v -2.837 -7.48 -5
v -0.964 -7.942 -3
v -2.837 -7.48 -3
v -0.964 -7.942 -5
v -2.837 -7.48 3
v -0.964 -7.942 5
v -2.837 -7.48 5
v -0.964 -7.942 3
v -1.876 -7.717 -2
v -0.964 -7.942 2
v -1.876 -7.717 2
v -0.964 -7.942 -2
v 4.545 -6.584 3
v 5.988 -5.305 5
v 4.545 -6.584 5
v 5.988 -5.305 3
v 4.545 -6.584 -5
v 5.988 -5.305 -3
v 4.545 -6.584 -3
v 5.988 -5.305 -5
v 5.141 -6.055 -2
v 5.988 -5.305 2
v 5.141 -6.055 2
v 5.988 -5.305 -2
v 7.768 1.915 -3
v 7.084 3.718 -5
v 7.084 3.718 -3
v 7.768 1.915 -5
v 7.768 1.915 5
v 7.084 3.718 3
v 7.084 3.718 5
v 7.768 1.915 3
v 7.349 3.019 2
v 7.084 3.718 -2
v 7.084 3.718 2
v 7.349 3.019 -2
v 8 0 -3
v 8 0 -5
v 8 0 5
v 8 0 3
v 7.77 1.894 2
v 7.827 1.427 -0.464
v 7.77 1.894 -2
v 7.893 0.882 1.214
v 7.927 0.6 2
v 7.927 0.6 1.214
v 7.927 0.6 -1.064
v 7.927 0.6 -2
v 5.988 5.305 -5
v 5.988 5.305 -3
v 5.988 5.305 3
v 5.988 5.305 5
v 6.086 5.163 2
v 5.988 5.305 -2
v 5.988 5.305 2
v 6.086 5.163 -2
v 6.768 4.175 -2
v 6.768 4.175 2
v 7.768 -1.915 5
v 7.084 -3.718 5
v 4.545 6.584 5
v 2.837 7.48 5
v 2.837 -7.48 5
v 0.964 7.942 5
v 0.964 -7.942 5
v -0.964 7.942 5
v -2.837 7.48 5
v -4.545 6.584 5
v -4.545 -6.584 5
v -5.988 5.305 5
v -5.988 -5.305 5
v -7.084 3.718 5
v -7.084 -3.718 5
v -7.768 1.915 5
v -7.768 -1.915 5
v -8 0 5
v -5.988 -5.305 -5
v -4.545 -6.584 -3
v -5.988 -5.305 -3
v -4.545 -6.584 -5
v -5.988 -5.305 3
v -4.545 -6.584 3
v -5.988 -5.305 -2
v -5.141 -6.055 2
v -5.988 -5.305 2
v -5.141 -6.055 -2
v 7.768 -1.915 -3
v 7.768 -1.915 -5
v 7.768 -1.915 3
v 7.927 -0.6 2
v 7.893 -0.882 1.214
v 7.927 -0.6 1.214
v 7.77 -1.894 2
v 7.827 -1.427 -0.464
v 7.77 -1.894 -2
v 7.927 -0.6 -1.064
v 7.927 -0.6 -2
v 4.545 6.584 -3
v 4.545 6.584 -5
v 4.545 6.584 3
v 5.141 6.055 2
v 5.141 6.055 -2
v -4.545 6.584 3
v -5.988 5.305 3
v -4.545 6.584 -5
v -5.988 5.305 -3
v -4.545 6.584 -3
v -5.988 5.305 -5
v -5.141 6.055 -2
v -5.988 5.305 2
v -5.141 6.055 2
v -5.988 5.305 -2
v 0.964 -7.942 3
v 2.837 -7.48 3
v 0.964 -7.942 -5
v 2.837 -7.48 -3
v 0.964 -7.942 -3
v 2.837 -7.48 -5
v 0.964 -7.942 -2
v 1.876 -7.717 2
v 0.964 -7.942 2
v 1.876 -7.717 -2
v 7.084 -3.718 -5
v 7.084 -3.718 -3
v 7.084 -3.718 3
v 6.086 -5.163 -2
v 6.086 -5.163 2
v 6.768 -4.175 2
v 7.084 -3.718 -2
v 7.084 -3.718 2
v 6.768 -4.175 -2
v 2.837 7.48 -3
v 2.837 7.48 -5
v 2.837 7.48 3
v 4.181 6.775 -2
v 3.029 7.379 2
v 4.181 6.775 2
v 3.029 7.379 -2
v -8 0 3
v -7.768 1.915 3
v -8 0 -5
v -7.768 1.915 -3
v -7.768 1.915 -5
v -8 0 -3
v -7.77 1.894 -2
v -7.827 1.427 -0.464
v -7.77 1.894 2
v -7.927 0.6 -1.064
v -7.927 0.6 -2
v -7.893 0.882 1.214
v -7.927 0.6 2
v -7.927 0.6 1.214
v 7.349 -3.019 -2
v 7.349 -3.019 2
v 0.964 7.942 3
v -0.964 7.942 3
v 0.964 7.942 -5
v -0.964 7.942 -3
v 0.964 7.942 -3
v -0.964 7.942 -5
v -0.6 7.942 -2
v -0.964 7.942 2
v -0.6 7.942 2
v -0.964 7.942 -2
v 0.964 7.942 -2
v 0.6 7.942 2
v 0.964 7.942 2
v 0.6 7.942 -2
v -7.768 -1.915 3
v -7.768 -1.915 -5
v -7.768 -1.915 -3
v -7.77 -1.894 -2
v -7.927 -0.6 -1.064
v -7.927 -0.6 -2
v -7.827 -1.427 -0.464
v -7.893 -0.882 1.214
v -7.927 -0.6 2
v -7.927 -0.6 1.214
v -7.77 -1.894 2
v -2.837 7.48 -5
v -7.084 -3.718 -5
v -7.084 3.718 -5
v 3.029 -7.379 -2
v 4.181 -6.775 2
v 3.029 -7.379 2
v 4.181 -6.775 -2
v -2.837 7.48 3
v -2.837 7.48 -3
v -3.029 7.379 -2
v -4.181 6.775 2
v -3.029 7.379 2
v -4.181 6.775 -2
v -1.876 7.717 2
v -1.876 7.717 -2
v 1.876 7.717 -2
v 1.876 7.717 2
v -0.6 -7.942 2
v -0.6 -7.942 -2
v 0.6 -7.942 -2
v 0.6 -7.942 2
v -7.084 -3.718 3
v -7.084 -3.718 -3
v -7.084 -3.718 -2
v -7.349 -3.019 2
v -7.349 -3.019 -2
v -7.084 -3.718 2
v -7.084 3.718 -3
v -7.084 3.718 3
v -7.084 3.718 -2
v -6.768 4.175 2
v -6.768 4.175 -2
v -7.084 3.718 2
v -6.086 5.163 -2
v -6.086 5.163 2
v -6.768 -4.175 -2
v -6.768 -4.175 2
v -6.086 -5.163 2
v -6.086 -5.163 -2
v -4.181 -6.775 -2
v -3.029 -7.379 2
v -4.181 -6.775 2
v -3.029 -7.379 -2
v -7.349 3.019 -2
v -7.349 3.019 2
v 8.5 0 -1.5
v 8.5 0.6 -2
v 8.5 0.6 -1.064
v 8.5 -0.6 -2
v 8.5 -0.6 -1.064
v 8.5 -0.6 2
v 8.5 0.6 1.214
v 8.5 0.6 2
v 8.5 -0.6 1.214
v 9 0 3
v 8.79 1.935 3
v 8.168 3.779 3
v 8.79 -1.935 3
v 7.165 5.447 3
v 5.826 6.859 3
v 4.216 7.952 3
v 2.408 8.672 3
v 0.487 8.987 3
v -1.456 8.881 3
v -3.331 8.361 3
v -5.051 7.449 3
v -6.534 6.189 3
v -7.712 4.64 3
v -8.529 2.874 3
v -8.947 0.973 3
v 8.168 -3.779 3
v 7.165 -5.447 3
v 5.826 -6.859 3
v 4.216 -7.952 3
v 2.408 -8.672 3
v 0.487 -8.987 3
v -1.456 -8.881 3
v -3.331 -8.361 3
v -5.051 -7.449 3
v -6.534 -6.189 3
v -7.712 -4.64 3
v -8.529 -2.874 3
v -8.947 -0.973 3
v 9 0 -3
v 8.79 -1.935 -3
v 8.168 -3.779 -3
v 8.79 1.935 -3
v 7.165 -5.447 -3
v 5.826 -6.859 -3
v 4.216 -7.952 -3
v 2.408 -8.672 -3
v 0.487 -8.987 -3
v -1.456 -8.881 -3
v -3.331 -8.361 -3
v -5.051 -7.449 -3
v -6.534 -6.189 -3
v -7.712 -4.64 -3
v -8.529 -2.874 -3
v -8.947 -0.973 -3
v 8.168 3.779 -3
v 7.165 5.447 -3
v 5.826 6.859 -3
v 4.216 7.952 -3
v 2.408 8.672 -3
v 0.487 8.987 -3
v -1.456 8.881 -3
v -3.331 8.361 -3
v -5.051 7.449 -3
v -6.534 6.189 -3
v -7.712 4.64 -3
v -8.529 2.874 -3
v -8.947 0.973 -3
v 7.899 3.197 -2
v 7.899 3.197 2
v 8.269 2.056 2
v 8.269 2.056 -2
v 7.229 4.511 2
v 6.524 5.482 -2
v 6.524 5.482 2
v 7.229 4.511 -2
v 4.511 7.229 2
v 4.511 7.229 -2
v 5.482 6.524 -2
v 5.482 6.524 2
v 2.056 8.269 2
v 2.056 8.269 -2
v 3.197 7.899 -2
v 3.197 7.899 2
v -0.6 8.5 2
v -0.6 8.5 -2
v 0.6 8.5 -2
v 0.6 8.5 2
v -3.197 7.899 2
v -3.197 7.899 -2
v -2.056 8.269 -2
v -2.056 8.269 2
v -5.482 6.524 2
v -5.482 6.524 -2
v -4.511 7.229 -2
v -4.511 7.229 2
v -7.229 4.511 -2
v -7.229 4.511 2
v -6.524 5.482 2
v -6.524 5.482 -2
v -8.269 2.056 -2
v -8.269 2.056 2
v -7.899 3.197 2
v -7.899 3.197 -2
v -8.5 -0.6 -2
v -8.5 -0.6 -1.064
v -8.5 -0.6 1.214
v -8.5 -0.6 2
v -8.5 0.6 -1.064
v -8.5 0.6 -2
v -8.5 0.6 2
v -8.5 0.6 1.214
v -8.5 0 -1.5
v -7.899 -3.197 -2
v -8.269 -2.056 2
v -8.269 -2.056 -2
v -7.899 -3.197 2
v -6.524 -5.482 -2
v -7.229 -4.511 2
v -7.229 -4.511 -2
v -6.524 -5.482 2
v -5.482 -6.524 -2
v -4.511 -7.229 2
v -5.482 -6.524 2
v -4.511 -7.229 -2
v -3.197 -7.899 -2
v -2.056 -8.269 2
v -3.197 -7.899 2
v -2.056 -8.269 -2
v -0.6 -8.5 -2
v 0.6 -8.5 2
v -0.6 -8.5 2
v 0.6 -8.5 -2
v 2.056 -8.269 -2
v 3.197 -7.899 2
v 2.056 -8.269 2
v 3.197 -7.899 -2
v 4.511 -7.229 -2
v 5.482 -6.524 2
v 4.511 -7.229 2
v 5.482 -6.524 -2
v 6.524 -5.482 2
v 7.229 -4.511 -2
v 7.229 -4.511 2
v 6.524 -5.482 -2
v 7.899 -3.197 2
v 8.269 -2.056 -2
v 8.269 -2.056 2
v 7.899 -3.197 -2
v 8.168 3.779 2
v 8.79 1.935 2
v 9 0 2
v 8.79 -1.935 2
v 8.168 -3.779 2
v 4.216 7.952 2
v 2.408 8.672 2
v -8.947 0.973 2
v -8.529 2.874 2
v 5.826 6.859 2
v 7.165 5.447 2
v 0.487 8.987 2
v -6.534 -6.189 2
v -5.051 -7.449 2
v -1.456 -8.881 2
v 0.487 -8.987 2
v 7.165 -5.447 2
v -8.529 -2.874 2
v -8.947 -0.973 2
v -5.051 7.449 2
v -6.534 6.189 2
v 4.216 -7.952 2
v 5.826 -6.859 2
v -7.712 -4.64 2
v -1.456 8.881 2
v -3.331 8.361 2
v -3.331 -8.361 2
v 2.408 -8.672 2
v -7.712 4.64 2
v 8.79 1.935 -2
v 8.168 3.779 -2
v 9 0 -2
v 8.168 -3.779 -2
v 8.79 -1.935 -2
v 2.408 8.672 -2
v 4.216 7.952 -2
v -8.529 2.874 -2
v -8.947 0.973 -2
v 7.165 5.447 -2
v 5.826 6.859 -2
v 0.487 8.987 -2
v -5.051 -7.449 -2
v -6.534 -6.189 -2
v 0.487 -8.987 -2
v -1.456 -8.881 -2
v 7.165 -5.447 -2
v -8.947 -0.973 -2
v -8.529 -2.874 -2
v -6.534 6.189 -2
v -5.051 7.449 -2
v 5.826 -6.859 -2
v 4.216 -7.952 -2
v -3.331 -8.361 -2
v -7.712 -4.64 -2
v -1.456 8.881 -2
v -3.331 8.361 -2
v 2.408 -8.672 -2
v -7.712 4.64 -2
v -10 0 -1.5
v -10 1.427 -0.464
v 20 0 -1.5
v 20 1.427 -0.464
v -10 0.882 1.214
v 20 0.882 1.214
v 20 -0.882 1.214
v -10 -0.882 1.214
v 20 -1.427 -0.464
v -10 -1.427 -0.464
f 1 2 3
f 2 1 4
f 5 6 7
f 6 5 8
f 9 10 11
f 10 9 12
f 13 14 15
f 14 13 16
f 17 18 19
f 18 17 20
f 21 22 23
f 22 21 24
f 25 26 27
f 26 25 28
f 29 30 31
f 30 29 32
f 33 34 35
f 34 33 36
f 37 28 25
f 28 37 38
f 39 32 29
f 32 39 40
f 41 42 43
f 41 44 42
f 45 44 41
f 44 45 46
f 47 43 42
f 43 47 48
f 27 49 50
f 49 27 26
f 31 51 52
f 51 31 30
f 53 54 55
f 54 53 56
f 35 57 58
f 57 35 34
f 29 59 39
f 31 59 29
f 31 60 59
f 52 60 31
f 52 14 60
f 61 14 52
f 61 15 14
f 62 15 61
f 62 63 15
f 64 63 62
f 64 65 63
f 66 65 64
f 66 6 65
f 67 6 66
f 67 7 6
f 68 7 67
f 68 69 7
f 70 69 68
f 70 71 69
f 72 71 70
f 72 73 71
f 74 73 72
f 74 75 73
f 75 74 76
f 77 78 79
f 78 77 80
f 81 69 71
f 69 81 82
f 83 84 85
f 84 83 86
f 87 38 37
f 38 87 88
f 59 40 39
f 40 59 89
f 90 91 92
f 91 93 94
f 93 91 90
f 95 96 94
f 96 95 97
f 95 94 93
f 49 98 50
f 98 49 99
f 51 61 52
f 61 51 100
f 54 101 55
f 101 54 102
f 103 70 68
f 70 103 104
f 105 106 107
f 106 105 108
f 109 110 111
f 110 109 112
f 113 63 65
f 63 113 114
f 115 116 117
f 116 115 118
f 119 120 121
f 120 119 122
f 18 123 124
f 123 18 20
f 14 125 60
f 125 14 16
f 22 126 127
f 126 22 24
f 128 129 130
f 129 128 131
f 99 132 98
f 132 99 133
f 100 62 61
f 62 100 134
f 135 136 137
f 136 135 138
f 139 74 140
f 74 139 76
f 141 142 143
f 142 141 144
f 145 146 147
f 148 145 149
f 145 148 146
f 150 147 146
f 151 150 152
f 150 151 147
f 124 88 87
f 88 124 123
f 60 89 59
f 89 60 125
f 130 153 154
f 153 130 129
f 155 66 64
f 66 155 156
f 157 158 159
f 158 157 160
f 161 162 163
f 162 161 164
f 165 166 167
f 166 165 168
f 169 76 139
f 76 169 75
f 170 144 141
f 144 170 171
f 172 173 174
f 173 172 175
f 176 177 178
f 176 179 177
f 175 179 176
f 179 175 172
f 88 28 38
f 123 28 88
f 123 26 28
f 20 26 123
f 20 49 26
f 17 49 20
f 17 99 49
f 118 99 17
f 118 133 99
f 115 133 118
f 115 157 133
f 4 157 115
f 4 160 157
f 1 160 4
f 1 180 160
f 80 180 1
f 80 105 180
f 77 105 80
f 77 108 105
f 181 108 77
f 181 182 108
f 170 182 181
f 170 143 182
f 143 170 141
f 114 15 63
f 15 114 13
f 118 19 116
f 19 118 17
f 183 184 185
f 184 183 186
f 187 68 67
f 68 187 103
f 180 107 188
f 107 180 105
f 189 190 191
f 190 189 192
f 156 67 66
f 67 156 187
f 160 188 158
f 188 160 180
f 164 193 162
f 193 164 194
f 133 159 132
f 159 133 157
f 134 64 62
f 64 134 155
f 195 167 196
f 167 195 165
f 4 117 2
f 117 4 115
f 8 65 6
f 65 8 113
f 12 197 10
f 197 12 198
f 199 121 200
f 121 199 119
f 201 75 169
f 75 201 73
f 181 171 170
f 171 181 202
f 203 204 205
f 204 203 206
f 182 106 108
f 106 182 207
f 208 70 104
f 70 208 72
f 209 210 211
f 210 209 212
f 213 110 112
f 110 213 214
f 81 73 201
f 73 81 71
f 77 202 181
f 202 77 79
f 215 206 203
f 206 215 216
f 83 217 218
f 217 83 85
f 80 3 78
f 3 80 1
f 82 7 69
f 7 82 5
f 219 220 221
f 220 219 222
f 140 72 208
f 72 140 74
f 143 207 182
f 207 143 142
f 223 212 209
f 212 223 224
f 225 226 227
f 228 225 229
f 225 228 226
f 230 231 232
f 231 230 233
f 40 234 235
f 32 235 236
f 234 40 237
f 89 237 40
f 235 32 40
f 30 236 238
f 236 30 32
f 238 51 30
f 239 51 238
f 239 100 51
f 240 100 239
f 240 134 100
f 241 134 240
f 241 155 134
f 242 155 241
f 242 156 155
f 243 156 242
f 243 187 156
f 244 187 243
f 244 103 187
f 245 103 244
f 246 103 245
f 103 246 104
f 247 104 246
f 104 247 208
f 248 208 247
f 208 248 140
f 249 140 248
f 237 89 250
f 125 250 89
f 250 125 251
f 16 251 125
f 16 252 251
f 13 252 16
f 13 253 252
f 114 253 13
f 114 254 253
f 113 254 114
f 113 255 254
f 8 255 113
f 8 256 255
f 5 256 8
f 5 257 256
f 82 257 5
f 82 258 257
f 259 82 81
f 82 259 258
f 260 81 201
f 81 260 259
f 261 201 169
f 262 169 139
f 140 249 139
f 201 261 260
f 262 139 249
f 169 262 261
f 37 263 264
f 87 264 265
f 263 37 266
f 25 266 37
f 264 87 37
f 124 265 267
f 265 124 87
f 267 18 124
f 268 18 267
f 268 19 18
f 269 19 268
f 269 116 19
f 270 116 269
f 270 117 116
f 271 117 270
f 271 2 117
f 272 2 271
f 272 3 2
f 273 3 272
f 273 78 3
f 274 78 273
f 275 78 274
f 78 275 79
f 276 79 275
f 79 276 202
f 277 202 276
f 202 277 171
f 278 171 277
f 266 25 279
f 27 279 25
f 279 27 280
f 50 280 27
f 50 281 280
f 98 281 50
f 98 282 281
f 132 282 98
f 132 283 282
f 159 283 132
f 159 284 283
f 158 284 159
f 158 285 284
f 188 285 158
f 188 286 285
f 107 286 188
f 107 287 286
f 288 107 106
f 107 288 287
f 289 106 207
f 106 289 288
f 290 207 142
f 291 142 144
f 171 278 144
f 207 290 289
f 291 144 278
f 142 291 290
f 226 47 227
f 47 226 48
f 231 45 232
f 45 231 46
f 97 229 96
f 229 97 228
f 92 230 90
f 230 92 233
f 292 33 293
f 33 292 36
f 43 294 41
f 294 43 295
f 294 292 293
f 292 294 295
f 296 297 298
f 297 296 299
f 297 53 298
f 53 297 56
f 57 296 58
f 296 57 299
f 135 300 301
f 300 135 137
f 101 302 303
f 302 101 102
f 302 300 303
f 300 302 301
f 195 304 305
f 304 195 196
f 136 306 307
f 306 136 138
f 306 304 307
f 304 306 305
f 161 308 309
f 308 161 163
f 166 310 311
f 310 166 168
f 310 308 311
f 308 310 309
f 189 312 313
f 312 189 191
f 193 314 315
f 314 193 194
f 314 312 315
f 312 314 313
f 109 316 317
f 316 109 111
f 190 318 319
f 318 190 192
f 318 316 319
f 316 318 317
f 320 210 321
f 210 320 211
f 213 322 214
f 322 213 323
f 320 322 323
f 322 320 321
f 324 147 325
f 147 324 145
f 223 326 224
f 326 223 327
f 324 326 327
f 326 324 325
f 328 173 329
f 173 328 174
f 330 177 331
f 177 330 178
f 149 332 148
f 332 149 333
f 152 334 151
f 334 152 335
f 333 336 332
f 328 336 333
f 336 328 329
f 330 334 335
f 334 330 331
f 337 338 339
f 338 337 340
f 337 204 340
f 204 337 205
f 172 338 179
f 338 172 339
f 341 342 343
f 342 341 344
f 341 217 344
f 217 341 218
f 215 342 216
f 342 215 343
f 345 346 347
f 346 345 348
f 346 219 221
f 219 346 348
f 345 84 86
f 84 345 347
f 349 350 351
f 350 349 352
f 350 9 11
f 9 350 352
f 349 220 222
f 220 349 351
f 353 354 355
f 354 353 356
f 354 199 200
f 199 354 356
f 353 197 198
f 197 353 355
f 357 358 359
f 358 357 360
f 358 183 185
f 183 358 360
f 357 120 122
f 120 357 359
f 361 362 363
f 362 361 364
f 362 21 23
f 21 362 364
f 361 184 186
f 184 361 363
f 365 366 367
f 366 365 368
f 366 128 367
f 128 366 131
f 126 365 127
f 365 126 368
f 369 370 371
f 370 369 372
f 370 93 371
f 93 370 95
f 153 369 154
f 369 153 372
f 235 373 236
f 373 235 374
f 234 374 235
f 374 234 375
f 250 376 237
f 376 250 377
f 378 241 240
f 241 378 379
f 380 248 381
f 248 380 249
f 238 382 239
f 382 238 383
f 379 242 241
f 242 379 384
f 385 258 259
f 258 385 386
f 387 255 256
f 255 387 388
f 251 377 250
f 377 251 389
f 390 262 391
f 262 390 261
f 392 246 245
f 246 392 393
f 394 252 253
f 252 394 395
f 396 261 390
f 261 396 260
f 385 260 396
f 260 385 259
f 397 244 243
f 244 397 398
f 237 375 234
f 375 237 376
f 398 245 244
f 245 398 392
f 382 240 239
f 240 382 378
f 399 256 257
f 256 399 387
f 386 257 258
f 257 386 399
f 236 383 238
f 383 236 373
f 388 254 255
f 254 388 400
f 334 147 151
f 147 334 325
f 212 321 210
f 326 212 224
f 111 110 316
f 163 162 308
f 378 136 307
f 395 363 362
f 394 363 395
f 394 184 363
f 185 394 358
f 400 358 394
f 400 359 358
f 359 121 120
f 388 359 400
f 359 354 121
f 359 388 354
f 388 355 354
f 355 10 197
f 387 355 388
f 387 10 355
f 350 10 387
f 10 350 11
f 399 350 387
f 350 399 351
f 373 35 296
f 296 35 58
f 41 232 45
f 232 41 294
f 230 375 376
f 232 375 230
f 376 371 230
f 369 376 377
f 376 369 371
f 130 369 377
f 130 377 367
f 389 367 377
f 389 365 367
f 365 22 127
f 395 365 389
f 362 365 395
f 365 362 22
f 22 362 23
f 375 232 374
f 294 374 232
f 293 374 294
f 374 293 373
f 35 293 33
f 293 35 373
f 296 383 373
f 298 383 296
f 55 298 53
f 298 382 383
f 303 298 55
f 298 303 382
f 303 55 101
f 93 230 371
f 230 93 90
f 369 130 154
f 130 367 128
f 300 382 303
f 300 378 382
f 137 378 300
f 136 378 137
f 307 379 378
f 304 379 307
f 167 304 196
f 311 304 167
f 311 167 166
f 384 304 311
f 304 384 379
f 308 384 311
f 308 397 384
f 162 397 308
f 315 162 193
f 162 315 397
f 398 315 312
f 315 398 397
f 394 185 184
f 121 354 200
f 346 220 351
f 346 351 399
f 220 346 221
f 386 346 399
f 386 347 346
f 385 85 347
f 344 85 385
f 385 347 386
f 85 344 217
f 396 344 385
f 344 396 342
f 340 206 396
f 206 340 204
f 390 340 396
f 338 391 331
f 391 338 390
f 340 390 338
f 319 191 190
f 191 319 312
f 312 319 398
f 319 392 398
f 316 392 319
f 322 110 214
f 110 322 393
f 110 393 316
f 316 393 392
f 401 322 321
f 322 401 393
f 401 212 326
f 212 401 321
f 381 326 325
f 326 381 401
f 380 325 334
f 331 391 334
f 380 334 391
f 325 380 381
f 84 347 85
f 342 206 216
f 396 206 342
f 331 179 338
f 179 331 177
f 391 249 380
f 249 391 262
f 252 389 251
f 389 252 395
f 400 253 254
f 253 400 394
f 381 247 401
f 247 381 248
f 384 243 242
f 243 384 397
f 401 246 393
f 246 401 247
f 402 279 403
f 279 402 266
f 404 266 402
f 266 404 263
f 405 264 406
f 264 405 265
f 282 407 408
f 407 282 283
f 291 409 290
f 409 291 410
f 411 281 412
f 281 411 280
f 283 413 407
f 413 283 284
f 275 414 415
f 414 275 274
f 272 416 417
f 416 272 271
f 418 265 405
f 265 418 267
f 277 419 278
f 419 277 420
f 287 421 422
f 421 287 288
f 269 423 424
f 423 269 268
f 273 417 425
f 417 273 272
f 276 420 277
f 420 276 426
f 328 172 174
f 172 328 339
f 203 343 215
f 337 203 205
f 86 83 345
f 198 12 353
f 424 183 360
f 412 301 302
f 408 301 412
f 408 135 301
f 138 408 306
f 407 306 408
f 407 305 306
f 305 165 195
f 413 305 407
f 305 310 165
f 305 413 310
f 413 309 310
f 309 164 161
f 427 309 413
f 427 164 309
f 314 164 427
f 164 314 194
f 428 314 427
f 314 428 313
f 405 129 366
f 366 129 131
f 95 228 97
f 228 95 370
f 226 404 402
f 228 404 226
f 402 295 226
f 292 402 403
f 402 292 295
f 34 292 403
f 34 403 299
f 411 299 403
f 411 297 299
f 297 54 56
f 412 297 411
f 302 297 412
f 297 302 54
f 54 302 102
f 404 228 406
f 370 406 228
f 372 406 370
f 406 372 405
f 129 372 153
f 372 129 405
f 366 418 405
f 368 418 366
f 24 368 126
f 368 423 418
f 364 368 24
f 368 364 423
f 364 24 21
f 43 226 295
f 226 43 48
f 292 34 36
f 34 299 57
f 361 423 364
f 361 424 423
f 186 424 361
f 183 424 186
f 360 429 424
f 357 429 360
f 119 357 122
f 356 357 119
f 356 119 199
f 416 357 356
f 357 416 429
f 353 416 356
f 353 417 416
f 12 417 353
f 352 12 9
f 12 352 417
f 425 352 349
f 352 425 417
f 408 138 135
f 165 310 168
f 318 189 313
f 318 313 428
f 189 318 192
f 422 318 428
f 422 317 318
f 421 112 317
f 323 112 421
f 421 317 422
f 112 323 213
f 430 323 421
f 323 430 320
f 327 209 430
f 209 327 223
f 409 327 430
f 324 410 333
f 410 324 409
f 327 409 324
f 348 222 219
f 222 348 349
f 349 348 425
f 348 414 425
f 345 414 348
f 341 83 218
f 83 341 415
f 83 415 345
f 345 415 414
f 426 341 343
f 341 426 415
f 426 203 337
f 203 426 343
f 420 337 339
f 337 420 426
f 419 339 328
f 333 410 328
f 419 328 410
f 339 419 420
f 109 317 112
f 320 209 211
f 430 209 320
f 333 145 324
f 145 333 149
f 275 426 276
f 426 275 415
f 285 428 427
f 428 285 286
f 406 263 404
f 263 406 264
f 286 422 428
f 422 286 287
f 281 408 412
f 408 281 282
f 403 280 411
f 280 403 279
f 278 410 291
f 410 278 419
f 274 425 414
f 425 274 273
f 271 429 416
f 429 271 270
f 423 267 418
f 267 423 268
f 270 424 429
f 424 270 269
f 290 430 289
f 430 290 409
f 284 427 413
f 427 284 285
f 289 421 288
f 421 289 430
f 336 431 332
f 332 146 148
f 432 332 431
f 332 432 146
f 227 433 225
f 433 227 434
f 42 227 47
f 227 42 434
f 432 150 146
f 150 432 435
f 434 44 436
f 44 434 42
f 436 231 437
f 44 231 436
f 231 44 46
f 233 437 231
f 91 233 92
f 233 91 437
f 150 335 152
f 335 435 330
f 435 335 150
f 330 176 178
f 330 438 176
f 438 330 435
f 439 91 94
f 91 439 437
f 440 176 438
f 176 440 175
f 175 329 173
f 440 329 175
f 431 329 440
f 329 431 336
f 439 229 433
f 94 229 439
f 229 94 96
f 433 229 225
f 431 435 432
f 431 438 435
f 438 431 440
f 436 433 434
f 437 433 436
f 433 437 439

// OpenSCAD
// Parameters
pulley_type = 0; //[0:1:1]
teeth_count = 20; //[10:60:1]
outer_diameter_mm = 16; //[8:32:0.5]
belt_pitch_mm = 2; //[1:5:0.1]
belt_width_mm = 6; //[3:20:0.5]
bore_diameter_mm = 5; //[2:12:0.1]
hub_diameter_mm = 12; //[6:24:0.5]
hub_length_mm = 10; //[5:25:0.5]
flange_diameter_mm = 18; //[10:36:0.5]
flange_thickness_mm = 1; //[0.5:3:0.1]
has_flanges = 1; //[0:1:1]
set_screw_count = 1; //[0:2:1]
set_screw_diameter_mm = 3; //[1.5:6:0.1]
set_screw_z_offset_mm = 5; //[0:20:0.5]
overlap_mm = 1; //[0.5:2:0.1]
tooth_depth_mm = 1.2; //[0.6:2.5:0.1]
tooth_width_mm = 1.2; //[0.6:3:0.1]
idler_groove_depth_mm = 1; //[0:3:0.1]
idler_groove_radius_mm = 1.5; //[0.5:4:0.1]
rim_thickness_radial_mm = 2; //[1:6:0.1]

// Pulley module
module pulley() {
  color("Silver") {
    // Pulley body and hub
    union() {
      translate([0, 0, 0])
        cylinder(r=outer_diameter_mm/2, h=hub_length_mm, center=true);
      translate([0, 0, 0])
        cylinder(r=hub_diameter_mm/2, h=hub_length_mm, center=true);
    }

    // Rim base
    difference() {
      translate([0, 0, 0])
        cylinder(r=outer_diameter_mm/2, h=belt_width_mm, center=true);
      translate([0, 0, 0])
        cylinder(r=bore_diameter_mm/2, h=hub_length_mm + 2*overlap_mm, center=true);
    }

    // Timing teeth or idler groove
    if (pulley_type == 0) {
      // Timing teeth
      for (i = [0:teeth_count-1]) {
        rotate([0, 0, i*360/teeth_count])
          translate([outer_diameter_mm/2 - tooth_depth_mm/2, 0, 0])
          cube([tooth_depth_mm + overlap_mm, tooth_width_mm, belt_width_mm], center=true);
      }
    } else {
      // Idler groove
      difference() {
        translate([0, 0, 0])
          cylinder(r=outer_diameter_mm/2, h=belt_width_mm, center=true);
        scale([idler_groove_radius_mm/(outer_diameter_mm/2 - idler_groove_depth_mm),
               idler_groove_radius_mm/(outer_diameter_mm/2 - idler_groove_depth_mm),
               belt_width_mm/(2*idler_groove_radius_mm)])
          rotate_extrude() translate([outer_diameter_mm/2 - idler_groove_depth_mm, 0, 0])
          circle(r=idler_groove_radius_mm);
      }
    }

    // Flanges
    if (has_flanges) {
      union() {
        translate([0, 0, belt_width_mm/2 + flange_thickness_mm/2 - overlap_mm])
          cylinder(r=flange_diameter_mm/2, h=flange_thickness_mm, center=true);
        translate([0, 0, -belt_width_mm/2 - flange_thickness_mm/2 + overlap_mm])
          cylinder(r=flange_diameter_mm/2, h=flange_thickness_mm, center=true);
      }
    }

    // Set screw holes
    if (set_screw_count > 0) {
      difference() {
        translate([hub_diameter_mm/2 - overlap_mm, 0, -hub_length_mm/2 + set_screw_z_offset_mm])
          rotate([0, 90, 0])
          cylinder(r=set_screw_diameter_mm/2, h=hub_diameter_mm + outer_diameter_mm + 2*overlap_mm, center=true);
        if (set_screw_count == 2) {
          translate([hub_diameter_mm/2 - overlap_mm, 0, -hub_length_mm/2 + set_screw_z_offset_mm])
            rotate([0, 90, 90])
            cylinder(r=set_screw_diameter_mm/2, h=hub_diameter_mm + outer_diameter_mm + 2*overlap_mm, center=true);
        }
      }
    }
  }
}

// Assembly
module assembly() {
  pulley();
}

assembly();
